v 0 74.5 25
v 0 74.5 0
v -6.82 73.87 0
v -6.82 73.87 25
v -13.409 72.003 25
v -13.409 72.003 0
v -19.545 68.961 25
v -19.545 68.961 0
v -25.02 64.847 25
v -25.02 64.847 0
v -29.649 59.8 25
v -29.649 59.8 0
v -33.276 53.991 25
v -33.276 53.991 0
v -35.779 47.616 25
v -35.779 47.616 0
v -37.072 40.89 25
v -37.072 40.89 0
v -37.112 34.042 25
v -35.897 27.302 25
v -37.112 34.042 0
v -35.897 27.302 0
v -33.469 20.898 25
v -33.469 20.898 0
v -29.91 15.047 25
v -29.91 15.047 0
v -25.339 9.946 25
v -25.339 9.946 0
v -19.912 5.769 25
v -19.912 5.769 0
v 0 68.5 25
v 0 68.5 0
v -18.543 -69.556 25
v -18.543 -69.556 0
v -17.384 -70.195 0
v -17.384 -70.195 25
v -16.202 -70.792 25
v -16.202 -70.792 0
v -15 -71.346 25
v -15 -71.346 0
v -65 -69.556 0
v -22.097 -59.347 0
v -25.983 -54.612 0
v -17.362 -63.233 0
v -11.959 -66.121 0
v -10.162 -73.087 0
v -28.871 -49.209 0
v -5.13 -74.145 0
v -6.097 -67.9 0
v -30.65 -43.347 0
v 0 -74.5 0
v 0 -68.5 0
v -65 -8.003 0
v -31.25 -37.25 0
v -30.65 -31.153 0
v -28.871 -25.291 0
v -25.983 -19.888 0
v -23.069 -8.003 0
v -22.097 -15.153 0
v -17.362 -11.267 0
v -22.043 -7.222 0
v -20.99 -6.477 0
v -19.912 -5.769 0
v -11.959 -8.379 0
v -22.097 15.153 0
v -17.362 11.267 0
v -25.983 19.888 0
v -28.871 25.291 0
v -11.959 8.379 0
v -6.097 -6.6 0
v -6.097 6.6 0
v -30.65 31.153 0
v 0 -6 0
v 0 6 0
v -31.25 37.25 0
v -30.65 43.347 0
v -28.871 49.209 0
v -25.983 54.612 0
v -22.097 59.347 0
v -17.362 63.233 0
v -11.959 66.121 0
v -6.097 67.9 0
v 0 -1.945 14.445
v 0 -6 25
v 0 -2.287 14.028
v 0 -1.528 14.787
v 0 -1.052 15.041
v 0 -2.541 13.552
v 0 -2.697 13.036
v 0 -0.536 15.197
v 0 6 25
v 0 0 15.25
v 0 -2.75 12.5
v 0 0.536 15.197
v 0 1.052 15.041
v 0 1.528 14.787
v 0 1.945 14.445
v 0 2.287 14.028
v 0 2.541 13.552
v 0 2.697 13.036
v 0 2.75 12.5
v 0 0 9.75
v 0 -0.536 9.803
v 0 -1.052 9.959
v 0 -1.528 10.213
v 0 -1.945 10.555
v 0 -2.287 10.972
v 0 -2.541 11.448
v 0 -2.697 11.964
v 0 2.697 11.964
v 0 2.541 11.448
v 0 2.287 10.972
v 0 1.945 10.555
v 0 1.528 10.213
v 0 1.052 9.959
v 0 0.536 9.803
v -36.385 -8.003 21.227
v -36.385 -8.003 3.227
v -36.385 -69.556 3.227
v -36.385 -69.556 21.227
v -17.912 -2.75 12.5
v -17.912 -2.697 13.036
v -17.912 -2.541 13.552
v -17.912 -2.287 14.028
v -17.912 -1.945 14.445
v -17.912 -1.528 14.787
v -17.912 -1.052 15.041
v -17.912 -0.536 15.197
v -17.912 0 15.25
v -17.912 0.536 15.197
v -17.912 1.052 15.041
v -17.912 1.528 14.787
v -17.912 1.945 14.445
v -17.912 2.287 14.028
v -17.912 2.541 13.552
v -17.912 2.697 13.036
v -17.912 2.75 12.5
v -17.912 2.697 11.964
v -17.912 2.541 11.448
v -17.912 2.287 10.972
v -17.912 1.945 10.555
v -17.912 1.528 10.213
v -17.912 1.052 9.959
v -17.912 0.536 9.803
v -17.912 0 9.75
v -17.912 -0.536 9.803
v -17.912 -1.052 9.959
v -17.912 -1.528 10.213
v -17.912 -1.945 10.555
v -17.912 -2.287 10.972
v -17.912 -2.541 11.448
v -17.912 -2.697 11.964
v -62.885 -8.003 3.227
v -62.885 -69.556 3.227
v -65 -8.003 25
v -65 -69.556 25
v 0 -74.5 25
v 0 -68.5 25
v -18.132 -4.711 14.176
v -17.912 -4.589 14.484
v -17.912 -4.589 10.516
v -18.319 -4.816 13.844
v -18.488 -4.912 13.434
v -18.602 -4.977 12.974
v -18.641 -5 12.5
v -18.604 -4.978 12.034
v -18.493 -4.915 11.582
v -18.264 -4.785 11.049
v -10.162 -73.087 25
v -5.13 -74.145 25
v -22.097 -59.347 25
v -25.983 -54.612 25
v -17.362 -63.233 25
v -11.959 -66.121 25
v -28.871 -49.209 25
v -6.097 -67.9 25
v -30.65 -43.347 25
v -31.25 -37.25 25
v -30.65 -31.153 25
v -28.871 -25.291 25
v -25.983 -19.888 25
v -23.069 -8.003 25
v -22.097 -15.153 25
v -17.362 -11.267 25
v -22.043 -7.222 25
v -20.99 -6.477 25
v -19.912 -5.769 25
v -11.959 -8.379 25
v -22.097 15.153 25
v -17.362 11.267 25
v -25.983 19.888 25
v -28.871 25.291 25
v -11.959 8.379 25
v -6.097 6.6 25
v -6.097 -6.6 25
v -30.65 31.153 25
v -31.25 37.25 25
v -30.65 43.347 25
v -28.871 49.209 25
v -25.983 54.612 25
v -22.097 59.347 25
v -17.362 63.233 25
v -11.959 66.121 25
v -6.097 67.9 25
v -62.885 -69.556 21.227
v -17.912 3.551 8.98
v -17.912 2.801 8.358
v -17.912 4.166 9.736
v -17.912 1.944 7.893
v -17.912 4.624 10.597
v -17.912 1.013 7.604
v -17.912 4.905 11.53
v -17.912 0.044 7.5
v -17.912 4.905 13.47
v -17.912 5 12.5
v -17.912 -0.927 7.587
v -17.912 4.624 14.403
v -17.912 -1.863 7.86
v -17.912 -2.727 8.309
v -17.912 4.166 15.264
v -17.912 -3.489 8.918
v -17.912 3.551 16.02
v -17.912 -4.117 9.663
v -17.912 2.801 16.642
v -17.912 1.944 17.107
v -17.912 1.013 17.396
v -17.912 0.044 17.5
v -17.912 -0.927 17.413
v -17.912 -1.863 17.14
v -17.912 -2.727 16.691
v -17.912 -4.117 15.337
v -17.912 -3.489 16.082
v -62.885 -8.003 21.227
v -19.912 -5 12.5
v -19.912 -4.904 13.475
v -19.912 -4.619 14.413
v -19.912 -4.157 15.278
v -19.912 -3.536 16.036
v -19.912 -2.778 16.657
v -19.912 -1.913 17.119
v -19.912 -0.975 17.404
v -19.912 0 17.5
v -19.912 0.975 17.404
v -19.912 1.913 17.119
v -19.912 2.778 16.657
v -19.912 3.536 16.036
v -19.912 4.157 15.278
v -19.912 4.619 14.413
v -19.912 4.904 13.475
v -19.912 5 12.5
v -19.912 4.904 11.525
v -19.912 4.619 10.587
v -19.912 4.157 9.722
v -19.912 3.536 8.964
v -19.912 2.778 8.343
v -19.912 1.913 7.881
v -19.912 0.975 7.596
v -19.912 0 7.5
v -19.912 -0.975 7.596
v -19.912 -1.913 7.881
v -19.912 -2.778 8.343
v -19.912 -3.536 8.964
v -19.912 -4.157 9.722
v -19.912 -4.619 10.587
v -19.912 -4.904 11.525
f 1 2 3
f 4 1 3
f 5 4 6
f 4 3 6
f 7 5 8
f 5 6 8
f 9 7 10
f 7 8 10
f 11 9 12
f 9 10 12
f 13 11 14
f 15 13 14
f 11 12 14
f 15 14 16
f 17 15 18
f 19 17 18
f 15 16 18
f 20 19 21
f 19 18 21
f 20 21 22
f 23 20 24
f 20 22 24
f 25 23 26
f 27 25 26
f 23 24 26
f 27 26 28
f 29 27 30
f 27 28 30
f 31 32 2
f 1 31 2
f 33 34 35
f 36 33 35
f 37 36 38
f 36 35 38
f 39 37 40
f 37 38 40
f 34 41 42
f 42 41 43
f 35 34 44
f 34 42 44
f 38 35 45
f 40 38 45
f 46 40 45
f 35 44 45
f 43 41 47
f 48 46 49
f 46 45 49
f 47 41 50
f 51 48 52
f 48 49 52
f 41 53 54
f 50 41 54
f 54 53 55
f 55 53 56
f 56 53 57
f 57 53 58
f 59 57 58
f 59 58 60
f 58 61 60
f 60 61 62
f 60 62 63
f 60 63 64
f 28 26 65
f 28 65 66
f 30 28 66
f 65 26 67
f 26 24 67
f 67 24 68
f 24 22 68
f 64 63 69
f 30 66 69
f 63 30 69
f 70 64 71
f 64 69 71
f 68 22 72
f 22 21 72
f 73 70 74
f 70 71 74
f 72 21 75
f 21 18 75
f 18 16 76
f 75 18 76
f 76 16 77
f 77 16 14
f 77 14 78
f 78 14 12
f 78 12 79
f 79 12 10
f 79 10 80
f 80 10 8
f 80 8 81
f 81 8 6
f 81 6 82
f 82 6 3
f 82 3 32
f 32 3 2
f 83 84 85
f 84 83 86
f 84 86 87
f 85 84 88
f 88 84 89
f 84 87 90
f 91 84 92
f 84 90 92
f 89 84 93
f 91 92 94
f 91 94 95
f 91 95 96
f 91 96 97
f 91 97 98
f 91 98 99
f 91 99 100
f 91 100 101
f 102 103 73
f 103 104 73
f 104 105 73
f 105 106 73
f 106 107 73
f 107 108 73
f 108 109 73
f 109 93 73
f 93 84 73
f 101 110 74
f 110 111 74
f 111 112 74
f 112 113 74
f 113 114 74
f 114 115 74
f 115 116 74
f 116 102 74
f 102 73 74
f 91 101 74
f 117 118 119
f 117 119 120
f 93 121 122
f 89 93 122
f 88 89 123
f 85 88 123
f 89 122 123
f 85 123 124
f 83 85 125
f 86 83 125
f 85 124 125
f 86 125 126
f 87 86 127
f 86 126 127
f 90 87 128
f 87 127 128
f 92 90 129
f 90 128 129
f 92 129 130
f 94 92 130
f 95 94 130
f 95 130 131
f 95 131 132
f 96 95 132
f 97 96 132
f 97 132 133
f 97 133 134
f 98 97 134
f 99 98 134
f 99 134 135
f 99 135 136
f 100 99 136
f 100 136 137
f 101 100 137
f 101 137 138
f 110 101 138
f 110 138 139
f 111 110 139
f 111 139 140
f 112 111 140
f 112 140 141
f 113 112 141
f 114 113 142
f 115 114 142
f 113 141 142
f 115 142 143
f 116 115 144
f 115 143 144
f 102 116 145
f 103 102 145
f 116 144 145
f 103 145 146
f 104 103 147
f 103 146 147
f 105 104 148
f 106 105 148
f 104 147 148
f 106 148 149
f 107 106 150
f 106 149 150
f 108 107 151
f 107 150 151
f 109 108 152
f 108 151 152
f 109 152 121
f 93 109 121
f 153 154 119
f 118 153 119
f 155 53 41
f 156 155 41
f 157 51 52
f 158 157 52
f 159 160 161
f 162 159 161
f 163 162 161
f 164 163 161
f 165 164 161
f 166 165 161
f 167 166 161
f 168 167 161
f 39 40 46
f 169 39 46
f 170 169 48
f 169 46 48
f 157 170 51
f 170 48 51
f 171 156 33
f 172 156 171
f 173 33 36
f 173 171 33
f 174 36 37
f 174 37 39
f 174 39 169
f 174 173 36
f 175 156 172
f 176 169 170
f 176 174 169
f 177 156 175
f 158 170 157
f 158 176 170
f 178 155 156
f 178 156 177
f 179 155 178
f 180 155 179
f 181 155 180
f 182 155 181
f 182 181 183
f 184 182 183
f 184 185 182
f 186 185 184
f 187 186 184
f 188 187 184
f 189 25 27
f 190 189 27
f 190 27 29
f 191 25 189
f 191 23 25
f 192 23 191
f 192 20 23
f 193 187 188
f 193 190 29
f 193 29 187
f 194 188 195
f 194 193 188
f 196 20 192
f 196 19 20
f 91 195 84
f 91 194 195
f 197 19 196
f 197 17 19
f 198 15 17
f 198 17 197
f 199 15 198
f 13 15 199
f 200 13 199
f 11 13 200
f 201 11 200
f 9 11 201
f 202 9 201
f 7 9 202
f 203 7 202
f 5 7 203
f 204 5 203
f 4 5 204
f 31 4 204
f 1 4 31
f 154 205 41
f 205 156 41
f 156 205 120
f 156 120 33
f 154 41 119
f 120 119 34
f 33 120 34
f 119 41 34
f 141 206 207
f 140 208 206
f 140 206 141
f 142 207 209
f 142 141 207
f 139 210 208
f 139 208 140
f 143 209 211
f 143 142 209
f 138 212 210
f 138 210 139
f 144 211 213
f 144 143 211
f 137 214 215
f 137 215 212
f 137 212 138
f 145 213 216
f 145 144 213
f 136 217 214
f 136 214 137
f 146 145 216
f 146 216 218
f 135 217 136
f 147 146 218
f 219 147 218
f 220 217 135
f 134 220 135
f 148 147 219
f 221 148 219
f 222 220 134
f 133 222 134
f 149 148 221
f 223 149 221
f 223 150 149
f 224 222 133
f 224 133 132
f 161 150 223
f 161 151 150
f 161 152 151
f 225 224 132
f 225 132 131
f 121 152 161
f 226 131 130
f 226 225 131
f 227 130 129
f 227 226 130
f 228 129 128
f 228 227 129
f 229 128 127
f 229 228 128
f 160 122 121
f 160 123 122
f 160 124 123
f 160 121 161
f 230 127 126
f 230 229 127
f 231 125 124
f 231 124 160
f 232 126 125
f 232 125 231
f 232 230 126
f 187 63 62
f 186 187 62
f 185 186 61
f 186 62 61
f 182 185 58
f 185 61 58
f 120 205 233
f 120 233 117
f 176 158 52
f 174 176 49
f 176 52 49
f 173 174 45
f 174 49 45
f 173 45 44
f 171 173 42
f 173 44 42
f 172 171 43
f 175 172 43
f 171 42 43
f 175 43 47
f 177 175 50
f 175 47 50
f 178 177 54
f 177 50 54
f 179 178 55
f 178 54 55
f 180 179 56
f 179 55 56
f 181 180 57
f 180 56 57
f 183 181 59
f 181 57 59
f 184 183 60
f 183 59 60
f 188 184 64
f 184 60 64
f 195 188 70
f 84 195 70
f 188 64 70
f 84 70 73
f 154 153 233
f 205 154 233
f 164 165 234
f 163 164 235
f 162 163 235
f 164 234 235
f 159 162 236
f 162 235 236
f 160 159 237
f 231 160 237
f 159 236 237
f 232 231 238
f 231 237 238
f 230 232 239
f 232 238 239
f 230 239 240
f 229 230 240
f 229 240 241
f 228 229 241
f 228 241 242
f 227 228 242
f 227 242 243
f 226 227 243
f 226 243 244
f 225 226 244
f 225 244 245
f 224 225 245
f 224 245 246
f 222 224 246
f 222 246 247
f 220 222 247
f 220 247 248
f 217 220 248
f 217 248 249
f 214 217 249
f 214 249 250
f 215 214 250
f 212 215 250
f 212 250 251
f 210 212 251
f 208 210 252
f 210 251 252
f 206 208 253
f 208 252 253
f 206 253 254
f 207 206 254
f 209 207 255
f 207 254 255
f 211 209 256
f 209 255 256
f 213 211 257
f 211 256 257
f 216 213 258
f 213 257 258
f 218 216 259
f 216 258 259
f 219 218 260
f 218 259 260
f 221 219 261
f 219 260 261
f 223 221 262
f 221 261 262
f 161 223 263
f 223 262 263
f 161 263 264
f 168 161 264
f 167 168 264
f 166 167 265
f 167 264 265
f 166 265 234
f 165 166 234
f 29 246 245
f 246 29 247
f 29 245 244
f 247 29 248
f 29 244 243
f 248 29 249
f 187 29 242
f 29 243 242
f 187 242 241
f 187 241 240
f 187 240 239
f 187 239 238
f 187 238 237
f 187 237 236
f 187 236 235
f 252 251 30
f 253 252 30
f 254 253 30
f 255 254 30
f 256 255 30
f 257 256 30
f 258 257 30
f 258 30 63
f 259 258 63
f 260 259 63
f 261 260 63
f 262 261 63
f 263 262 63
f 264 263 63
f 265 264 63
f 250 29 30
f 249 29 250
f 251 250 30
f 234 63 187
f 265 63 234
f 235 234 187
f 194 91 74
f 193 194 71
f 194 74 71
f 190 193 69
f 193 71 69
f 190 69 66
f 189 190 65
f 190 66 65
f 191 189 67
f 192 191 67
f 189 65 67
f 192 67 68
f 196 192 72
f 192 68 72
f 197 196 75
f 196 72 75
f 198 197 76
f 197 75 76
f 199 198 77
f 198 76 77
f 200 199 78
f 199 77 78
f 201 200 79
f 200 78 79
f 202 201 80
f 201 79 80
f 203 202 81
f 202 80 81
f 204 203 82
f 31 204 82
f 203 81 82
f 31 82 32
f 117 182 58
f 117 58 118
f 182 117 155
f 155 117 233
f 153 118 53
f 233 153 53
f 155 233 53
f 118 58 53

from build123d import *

# Parameters (mm, degrees)
F1_DEPTH = 25
F2_R     = 2.75
F3_DEPTH = 19.9132636974
F4_R     = 5
F5_DEPTH = 2
F6_DEPTH = 25
F7_W     = 26.5
F7_H     = 18
F8_DEPTH = 61.5532770753


with BuildPart() as f1:
    # F0 (on Top) → F1 (new body)
    with BuildSketch(Plane.XY):
        with BuildLine():
            Line((0, 68.5), (0, 74.5))
            ThreePointArc((0, 74.5), (-35.7787380635, 47.6155391844), (-19.9122636974, 5.7688269843))
            ThreePointArc((-19.9122636974, 5.7688269843), (-10.3655391695, 1.4712619322), (3.09e-08, 0))
            Line((0, 0), (0, 6))
            ThreePointArc((0, 6), (-31.25, 37.25), (0, 68.5))
        make_face()
        with BuildLine():
            ThreePointArc((3.09e-08, 0), (-10.3655391695, 1.4712619322), (-19.9122636974, 5.7688269843))
            Line((-19.9122636974, 5.7688269843), (-19.9122636974, -5.7688269843))
            ThreePointArc((-19.9122636974, -5.7688269843), (-17.5050379591, -4.3693651818), (-15, -3.1536292254))
            ThreePointArc((-15, -3.1536292254), (-7.6639639933, -0.7969321468), (3.09e-08, 0))
        make_face()
        with BuildLine():
            Line((0, -6), (0, 0))
            ThreePointArc((3.09e-08, 0), (-7.6639639933, -0.7969321468), (-15, -3.1536292254))
            Line((-15, -3.1536292254), (-15, -8.0031603575))
            Line((-15, -8.0031603575), (-23.0691324268, -8.0031603575))
            ThreePointArc((-23.0691324268, -8.0031603575), (-27.5276929828, -12.1544103666), (-31.25, -16.9768650673))
            ThreePointArc((-31.25, -16.9768650673), (-37.25, -37.25), (-31.25, -57.5231349327))
            ThreePointArc((-31.25, -57.5231349327), (-25.6133761152, -64.2965795246), (-18.543370794, -69.5564374328))
            Line((-18.543370794, -69.5564374328), (-15, -69.5564374328))
            Line((-15, -69.5564374328), (-15, -71.3463707746))
            ThreePointArc((-15, -71.3463707746), (-7.6639640084, -73.70306785), (0, -74.5))
            Line((0, -74.5), (0, -68.5))
            ThreePointArc((0, -68.5), (-31.25, -37.25), (0, -6))
        make_face()
        with BuildLine():
            ThreePointArc((-18.543370794, -69.5564374328), (-16.7955469217, -70.4986406279), (-15, -71.3463707746))
            Line((-15, -71.3463707746), (-15, -69.5564374328))
            Line((-15, -69.5564374328), (-18.543370794, -69.5564374328))
        make_face()
    extrude(amount=F1_DEPTH)

    # F2 (on face) → F3 (cut, through all)
    with BuildSketch(Plane(origin=(-19.9122636974, 0, 0), x_dir=(0, -1, 0), z_dir=(-1, 0, 0))):
        with Locations((0, 12.5)):
            Circle(F2_R)
    extrude(amount=-F3_DEPTH, mode=Mode.SUBTRACT)

    # F4 (on face) → F5 (cut)
    with BuildSketch(Plane(origin=(-19.9122636974, 0, 0), x_dir=(0, -1, 0), z_dir=(-1, 0, 0))):
        with Locations((0, 12.5)):
            Circle(F4_R)
    extrude(amount=-F5_DEPTH, mode=Mode.SUBTRACT)

    # F0 (on Top) → F6 (join)
    with BuildSketch(Plane.XY):
        with BuildLine():
            ThreePointArc((-31.25, -57.5231349327), (-37.25, -37.25), (-31.25, -16.9768650673))
            Line((-31.25, -16.9768650673), (-31.25, -12.7797988951))
            Line((-31.25, -12.7797988951), (-48.75, -12.7797988951))
            Line((-48.75, -12.7797988951), (-48.75, -64.7797988951))
            Line((-48.75, -64.7797988951), (-31.25, -64.7797988951))
            Line((-31.25, -64.7797988951), (-31.25, -57.5231349327))
        make_face()
        with BuildLine():
            ThreePointArc((-31.25, -16.9768650673), (-27.5276929828, -12.1544103666), (-23.0691324268, -8.0031603575))
            Line((-23.0691324268, -8.0031603575), (-65, -8.0031603575))
            Line((-65, -8.0031603575), (-65, -69.5564374328))
            Line((-65, -69.5564374328), (-18.543370794, -69.5564374328))
            ThreePointArc((-18.543370794, -69.5564374328), (-25.6133761152, -64.2965795246), (-31.25, -57.5231349327))
            Line((-31.25, -57.5231349327), (-31.25, -64.7797988951))
            Line((-31.25, -64.7797988951), (-48.75, -64.7797988951))
            Line((-48.75, -64.7797988951), (-48.75, -12.7797988951))
            Line((-48.75, -12.7797988951), (-31.25, -12.7797988951))
            Line((-31.25, -12.7797988951), (-31.25, -16.9768650673))
        make_face()
        with BuildLine():
            ThreePointArc((-15, -3.1536292254), (-17.5050379591, -4.3693651818), (-19.9122636974, -5.7688269843))
            ThreePointArc((-19.9122636974, -5.7688269843), (-21.5197157184, -6.8449948956), (-23.0691324268, -8.0031603575))
            Line((-23.0691324268, -8.0031603575), (-15, -8.0031603575))
            Line((-15, -8.0031603575), (-15, -3.1536292254))
        make_face()
    extrude(amount=F6_DEPTH)

    # F7 (on face) → F8 (cut, through all)
    with BuildSketch(Plane.XZ.offset(69.5564374328)):
        with Locations((-49.6350233853, 12.2272316366)):
            Rectangle(F7_W, F7_H)
    extrude(amount=-F8_DEPTH, mode=Mode.SUBTRACT)


solid = f1.part
